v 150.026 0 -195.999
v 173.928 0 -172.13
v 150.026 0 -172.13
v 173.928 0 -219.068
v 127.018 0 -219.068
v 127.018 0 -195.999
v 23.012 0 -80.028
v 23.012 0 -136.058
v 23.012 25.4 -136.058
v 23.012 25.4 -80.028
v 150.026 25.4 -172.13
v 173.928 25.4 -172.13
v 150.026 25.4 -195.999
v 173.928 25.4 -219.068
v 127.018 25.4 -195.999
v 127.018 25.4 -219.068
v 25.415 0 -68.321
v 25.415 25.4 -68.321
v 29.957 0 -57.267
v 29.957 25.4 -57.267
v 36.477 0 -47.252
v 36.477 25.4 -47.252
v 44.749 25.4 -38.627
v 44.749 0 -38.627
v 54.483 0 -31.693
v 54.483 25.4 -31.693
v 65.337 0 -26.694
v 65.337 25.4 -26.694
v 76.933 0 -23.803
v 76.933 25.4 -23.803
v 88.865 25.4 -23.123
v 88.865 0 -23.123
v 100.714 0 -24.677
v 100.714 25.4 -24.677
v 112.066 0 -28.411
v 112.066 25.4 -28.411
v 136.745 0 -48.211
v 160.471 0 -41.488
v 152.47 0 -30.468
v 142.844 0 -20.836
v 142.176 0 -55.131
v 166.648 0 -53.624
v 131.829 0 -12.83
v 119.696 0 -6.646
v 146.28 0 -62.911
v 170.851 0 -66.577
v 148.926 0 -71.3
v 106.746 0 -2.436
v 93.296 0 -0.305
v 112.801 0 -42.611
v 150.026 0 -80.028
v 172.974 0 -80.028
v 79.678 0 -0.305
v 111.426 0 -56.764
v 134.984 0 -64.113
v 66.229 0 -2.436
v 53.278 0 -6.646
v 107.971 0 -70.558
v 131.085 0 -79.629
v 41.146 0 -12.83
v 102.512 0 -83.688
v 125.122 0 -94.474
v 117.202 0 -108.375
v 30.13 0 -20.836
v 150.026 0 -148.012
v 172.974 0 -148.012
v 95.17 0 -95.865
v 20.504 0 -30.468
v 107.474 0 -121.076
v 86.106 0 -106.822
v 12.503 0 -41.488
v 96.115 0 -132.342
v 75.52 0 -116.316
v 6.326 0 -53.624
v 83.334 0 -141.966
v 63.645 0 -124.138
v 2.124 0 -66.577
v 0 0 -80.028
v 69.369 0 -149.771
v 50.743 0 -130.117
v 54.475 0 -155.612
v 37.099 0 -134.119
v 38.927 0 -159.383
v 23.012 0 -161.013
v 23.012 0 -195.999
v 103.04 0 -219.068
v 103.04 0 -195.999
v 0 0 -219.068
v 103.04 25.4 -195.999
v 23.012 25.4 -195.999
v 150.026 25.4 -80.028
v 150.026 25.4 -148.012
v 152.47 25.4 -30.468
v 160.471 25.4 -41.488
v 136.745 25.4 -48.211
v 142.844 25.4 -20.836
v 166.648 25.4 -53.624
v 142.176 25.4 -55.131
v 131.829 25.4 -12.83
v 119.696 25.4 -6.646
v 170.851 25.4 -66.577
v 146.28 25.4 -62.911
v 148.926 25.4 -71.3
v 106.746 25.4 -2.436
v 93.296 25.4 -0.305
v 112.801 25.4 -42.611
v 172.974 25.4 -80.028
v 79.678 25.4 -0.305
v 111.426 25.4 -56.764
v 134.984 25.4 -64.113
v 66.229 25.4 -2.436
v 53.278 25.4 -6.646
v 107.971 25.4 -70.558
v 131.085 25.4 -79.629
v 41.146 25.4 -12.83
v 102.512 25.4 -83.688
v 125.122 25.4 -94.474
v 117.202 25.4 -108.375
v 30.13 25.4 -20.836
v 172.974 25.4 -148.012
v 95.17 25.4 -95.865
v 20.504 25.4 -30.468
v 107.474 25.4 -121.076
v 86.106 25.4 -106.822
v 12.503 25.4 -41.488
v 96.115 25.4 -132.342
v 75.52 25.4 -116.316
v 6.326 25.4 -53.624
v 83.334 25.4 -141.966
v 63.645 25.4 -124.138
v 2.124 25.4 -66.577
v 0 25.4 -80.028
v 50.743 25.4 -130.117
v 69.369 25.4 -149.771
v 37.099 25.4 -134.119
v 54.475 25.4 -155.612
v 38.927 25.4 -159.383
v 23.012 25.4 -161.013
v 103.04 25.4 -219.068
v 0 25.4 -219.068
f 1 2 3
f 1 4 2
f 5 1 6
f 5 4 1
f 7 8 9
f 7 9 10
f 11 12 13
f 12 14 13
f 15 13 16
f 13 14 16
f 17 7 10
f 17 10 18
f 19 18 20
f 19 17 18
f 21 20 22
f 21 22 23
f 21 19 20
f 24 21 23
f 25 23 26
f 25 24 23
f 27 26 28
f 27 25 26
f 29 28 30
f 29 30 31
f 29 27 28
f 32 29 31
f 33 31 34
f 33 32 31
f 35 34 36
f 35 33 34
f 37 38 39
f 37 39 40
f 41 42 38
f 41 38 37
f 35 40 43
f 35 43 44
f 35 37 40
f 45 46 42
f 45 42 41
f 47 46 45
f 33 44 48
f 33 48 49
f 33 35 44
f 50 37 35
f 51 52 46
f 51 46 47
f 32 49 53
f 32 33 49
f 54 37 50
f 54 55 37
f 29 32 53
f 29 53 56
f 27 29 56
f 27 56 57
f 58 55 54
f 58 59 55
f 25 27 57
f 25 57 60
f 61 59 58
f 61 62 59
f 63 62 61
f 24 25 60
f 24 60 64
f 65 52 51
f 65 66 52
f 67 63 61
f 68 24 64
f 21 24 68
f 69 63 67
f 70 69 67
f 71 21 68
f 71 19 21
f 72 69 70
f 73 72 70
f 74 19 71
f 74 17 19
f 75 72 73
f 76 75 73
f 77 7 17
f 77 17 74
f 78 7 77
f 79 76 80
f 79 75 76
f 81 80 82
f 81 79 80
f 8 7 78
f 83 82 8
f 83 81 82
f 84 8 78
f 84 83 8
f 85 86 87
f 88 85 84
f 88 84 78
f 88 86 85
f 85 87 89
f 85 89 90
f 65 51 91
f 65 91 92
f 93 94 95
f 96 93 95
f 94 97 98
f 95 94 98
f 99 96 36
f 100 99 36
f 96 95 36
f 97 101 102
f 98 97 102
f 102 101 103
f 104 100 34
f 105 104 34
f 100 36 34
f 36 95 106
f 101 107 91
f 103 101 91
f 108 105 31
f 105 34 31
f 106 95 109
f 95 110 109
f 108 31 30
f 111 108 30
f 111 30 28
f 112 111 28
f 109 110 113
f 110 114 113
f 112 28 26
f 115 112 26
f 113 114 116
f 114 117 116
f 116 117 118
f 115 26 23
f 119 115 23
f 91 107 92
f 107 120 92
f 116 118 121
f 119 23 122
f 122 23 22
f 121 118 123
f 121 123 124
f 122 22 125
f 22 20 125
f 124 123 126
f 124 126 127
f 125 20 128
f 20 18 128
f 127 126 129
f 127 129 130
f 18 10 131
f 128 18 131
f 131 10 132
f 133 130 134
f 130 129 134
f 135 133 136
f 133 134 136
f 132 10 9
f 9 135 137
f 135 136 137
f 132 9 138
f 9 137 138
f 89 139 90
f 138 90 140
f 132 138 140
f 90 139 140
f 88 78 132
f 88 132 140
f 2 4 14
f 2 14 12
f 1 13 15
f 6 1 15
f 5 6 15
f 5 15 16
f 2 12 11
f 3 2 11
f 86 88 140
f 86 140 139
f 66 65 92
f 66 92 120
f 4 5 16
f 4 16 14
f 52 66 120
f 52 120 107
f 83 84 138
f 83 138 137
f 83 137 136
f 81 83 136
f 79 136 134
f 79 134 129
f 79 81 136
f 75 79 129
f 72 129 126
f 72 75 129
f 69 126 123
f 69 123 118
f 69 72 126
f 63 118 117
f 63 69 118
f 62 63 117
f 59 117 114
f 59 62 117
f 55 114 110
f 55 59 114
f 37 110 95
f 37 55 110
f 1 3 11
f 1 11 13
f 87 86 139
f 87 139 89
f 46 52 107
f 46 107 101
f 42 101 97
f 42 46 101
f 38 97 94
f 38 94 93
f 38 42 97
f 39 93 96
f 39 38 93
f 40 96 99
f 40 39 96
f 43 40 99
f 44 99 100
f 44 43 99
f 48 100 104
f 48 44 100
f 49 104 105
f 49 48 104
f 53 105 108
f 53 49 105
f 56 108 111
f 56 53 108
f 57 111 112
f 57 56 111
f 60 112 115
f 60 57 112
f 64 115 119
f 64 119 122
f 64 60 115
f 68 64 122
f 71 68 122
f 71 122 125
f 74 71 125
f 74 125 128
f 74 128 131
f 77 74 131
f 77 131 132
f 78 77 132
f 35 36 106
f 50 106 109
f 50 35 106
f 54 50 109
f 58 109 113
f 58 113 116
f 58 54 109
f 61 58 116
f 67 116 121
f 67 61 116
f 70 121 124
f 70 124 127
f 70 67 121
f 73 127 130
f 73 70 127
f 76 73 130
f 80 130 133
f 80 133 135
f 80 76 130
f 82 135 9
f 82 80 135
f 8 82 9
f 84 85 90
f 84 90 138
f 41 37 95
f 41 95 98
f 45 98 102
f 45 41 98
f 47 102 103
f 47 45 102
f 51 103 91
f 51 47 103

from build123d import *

# Parameters (mm, degrees)
BOSS_EXTRUDE1_DEPTH   = 25.4
BOSS_EXTRUDE1_2_DEPTH = 25.4


with BuildPart() as part:
    # Sketch1 → Boss-Extrude1 (new body)
    with BuildSketch(Plane(origin=(0, 0, 0), x_dir=(1, 0, 0), z_dir=(0, 1, 0))):
        with BuildLine():
            Line((0, 80.02759766), (0, 219.067642019))
            Line((0, 219.067642019), (103.040086398, 219.067642019))
            Line((103.040086398, 219.067642019), (103.040086398, 195.999460881))
            Line((103.040086398, 195.999460881), (23.011829096, 195.999460881))
            Line((23.011829096, 195.999460881), (23.011829096, 161.013213822))
            ThreePointArc((23.011829096, 161.013213822), (101.985495584, 126.901824422), (136.744902109, 48.211224327))
            ThreePointArc((136.744902109, 48.211224327), (146.280346481, 62.911008862), (150.026111113, 80.02759766))
            Line((150.026111113, 80.02759766), (150.026111113, 148.011746996))
            Line((150.026111113, 148.011746996), (172.974333949, 148.011746996))
            Line((172.974333949, 148.011746996), (172.974333949, 80.02759766))
            ThreePointArc((172.974333949, 80.02759766), (86.487166974, 0.037389651), (0, 80.02759766))
        make_face()
        with BuildLine():
            Line((23.011829096, 136.058182002), (23.011829096, 80.02759766))
            ThreePointArc((23.011829096, 80.02759766), (54.48283159, 31.69310754), (112.066438029, 28.410547154))
            ThreePointArc((112.066438029, 28.410547154), (90.841729512, 101.512108787), (23.011829096, 136.058182002))
        make_face(mode=Mode.SUBTRACT)
    extrude(amount=BOSS_EXTRUDE1_DEPTH)


with BuildPart() as body_2:
    # Sketch1 → Boss-Extrude1 2 (new body)
    with BuildSketch(Plane(origin=(0, 0, 0), x_dir=(1, 0, 0), z_dir=(0, 1, 0))):
        Polygon((173.927929859, 172.130085515), (150.026111113, 172.130085515), (150.026111113, 195.999460881), (127.017693125, 195.999460881), (127.017693125, 219.067642019), (173.927929859, 219.067642019), align=None)
    extrude(amount=BOSS_EXTRUDE1_2_DEPTH)


solid = Compound([part.part, body_2.part])
